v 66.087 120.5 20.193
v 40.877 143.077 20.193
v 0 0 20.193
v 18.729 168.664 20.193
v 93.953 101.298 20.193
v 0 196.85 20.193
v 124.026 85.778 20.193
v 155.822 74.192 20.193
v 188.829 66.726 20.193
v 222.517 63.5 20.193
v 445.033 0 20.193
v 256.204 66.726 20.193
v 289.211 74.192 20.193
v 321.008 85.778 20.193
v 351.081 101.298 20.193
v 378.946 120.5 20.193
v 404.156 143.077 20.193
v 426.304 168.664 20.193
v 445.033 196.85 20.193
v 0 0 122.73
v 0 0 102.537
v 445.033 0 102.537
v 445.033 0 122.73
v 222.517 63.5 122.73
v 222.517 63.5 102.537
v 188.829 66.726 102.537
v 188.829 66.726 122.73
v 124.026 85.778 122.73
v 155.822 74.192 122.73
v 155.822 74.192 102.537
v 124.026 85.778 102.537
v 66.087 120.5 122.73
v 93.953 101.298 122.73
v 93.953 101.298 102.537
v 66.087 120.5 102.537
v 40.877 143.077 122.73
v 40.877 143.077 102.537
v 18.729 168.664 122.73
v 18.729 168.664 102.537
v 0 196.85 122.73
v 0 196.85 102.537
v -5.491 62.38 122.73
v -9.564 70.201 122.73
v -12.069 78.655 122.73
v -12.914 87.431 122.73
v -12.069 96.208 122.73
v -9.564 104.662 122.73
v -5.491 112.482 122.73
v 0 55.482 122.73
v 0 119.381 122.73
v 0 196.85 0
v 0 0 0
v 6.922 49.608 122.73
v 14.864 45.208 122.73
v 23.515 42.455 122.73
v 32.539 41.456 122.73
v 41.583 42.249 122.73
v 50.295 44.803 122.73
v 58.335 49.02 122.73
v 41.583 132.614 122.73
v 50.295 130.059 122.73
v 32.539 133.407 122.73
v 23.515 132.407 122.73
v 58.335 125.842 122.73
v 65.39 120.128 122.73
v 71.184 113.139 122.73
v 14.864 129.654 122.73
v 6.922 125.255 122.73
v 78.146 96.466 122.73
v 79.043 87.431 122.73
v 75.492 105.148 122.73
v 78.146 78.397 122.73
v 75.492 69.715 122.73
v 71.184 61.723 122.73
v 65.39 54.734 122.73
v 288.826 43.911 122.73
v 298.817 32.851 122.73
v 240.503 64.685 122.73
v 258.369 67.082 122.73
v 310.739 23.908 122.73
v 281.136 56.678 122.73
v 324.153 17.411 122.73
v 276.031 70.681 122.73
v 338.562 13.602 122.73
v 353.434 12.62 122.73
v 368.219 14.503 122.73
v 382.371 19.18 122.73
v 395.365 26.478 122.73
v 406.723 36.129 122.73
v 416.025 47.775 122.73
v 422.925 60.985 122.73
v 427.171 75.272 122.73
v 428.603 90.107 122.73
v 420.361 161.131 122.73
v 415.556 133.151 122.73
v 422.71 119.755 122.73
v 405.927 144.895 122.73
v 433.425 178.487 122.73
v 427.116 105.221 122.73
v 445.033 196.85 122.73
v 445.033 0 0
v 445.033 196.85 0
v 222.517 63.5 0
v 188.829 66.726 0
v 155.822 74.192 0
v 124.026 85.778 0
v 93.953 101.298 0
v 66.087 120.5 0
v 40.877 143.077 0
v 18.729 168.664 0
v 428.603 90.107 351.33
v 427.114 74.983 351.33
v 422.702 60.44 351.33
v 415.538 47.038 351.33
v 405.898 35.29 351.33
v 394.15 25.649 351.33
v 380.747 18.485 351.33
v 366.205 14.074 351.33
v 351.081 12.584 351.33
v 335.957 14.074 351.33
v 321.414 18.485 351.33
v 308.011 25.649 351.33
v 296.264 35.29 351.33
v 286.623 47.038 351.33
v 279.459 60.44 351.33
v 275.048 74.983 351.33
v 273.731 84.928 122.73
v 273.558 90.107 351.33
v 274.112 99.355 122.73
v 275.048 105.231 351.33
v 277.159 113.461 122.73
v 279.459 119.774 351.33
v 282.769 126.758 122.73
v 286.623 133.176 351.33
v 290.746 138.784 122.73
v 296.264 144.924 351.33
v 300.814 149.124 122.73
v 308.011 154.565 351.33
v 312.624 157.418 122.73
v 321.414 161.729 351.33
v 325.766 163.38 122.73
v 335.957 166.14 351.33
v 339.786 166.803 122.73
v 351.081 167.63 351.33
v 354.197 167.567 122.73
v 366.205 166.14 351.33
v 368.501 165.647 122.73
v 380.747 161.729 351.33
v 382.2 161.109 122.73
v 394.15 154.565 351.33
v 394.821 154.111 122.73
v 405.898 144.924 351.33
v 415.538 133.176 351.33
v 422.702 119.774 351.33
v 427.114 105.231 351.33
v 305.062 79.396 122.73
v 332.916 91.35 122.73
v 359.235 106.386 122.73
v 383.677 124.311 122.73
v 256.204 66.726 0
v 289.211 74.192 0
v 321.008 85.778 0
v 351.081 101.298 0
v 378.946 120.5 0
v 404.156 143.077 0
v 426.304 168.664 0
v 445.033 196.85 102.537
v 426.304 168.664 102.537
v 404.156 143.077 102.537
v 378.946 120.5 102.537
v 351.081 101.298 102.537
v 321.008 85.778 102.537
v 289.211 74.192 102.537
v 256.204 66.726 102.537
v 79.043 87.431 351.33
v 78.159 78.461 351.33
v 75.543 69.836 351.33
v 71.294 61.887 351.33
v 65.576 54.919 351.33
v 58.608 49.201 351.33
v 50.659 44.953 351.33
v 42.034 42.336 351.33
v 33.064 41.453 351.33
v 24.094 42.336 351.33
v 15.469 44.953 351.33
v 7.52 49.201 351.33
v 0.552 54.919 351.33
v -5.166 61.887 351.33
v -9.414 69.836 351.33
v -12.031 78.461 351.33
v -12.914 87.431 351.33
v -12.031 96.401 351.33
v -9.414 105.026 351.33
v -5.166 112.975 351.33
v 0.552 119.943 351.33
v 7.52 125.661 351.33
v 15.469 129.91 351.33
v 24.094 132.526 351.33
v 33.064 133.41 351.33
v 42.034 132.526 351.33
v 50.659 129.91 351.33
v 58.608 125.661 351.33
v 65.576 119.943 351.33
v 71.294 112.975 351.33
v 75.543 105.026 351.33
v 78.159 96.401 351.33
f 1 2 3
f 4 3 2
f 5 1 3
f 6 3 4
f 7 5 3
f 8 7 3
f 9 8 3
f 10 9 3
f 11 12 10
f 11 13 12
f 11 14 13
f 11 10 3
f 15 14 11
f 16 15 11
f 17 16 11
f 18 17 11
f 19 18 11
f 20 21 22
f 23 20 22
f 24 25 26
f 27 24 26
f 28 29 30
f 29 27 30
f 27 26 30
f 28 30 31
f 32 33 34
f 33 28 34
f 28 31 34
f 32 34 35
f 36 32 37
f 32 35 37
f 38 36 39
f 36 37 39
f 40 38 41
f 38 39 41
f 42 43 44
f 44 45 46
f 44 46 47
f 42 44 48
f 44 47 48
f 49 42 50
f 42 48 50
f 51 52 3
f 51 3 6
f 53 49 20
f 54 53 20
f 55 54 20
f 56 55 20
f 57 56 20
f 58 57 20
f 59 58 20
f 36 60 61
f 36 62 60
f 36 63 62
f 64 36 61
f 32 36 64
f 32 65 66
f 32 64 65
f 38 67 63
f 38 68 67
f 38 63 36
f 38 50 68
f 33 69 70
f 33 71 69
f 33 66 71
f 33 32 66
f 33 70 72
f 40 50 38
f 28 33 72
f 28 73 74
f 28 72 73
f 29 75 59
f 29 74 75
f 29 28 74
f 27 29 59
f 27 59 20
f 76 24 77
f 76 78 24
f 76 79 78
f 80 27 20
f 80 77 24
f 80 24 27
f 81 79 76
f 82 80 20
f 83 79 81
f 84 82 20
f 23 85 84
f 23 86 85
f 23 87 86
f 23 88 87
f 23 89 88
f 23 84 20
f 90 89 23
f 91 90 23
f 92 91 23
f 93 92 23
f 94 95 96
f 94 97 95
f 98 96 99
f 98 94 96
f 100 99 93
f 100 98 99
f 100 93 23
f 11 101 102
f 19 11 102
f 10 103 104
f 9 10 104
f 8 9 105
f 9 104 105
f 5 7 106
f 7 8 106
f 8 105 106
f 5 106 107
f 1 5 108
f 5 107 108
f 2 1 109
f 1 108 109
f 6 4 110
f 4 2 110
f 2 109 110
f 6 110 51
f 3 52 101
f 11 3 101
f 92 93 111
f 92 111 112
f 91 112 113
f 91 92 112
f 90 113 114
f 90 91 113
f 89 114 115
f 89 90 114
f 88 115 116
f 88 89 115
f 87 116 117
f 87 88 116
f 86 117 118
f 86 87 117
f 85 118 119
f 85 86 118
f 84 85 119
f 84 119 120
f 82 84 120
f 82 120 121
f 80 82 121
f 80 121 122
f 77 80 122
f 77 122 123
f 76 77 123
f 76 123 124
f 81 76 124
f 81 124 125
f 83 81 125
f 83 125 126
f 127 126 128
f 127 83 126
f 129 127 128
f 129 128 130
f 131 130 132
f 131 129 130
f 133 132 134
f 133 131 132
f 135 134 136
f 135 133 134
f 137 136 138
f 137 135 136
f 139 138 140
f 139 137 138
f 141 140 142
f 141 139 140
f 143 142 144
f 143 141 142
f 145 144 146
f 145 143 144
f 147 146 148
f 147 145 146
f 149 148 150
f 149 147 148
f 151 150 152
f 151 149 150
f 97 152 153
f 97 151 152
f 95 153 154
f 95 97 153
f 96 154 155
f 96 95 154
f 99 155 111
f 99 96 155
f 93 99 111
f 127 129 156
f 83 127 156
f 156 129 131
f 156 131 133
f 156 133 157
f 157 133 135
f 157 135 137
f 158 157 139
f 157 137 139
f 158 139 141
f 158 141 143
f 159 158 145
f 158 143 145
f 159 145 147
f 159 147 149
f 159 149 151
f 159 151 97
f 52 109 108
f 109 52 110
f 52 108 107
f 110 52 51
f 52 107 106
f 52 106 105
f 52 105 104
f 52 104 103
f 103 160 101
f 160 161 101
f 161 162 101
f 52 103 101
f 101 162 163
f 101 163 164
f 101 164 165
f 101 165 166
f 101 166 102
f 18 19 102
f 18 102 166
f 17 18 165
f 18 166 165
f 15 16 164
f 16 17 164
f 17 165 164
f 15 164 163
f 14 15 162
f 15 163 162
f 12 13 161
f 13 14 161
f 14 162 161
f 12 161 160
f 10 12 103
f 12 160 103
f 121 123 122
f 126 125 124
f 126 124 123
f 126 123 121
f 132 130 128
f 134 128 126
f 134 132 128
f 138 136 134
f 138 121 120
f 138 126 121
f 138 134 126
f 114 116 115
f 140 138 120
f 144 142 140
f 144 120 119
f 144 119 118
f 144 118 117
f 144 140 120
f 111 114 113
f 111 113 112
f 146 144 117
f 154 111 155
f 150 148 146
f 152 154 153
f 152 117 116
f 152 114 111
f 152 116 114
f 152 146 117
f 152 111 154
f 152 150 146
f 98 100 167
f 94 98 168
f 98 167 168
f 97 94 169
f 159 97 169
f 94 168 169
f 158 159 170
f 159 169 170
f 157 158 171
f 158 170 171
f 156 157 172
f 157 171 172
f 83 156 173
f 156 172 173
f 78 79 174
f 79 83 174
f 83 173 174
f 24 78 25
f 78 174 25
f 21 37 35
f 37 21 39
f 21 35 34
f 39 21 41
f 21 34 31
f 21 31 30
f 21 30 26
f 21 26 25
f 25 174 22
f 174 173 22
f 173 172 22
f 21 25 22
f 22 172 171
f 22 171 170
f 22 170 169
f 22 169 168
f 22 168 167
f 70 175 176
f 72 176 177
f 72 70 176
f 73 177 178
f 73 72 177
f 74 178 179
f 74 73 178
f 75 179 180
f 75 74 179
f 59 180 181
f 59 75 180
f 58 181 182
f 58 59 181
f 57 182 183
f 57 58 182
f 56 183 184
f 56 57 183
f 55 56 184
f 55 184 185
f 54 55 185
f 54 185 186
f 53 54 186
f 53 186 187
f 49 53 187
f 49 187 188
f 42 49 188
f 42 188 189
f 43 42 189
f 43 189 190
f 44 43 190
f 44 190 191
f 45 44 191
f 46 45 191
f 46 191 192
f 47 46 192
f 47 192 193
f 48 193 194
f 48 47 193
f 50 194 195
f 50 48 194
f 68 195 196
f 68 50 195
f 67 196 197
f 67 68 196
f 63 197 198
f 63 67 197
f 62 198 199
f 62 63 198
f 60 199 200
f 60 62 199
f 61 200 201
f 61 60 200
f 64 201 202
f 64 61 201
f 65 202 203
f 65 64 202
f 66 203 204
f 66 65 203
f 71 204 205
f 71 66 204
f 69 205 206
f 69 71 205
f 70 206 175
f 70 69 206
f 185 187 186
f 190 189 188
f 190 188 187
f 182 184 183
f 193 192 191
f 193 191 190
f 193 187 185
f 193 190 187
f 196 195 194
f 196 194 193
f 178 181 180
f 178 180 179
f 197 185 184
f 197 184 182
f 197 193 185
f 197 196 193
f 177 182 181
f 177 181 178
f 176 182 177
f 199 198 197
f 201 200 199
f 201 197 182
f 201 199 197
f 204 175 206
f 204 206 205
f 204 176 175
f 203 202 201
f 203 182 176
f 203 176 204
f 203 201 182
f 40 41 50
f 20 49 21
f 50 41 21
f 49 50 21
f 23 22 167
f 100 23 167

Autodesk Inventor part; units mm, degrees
ref_plane "YZ Plane" through (0, 0, 0) normal (1, 0, 0) x (0, 1, 0)
ref_plane "XZ Plane" through (0, 0, 0) normal (0, 1, 0) x (-1, 0, 0)
ref_plane "XY Plane" through (0, 0, 0) normal (0, 0, 1) x (1, 0, 0)
sketch "Sketch1" plane through (0, 0, 0) normal (0, 0, 1) x (1, 0, 0)
  line L0 (0, 0) -> (445.0334, 0)
  line L1 (445.0334, 0) -> (445.0334, 196.85)
  line L2 (0, 0) -> (0, 196.85)
  arc A0 (0, 196.85) -> (222.5167, 63.5) centre (231.0477, 330.0635) ccw
  arc A1 (222.5167, 63.5) -> (445.0334, 196.85) centre (213.9857, 330.0635) ccw
  dimension "d0" = 445.0334
  dimension "d1" = 196.85
  dimension "d3" = 266.7
  dimension "d4" = 266.7
extrude "Extrusion1" add sketch "Sketch1" along normal blind 20.193
sketch "Sketch2" plane through (0, 0, 20.193) normal (0, 0, 1) x (1, 0, 0)
  line L0 (0, 0) -> (445.0334, 0) projected
  line L1 (111.2011, 0) -> (141.5914, 0)
  line L2 (141.5914, 0) -> (141.5914, 15.1977)
  line L3 (141.5914, 15.1977) -> (111.2011, 15.1977)
  line L4 (111.2011, 15.1977) -> (111.2011, 0)
extrude "Extrusion2" add sketch "Sketch2" along normal blind 82.3443
sketch "Sketch3" plane through (0, 0, 102.5373) normal (0, 0, 1) x (1, 0, 0)
  line L0 (111.2011, 0) -> (141.5914, 0) projected
  line L1 (141.5914, 0) -> (141.5914, 15.1977) projected
  line L2 (141.5914, 15.1977) -> (111.2011, 15.1977) projected
  line L3 (111.2011, 15.1977) -> (111.2011, 0) projected
  line L4 (141.5914, 15.1977) -> (141.5914, 0) projected
  line L5 (141.5914, 0) -> (445.0334, 0) projected
  line L6 (445.0334, 0) -> (445.0334, 196.85) projected
  arc A0 (222.5167, 63.5) -> (445.0334, 196.85) centre (213.9857, 330.0635) ccw projected
  arc A1 (0, 196.85) -> (222.5167, 63.5) centre (231.0477, 330.0635) ccw projected
  line L7 (0, 196.85) -> (0, 0) projected
  line L8 (0, 0) -> (111.2011, 0) projected
  line L9 (111.2011, 0) -> (111.2011, 15.1977) projected
  line L10 (111.2011, 15.1977) -> (141.5914, 15.1977) projected
extrude "Extrusion3" add sketch "Sketch3" along normal blind 20.193
sketch "Sketch4" plane through (111.2011, 15.1977, 20.193) normal (0, 1, 0) x (1, 0, 0)
  line L0 (0, 0) -> (30.3903, 0) projected
  line L1 (0, 0) -> (0, -82.3443) projected
  line L2 (30.3903, -82.3443) -> (0, -82.3443) projected
  line L3 (30.3903, 0) -> (30.3903, -82.3443) projected
  point P0 (-111.2011, 20.193)
extrude "Extrusion4" cut sketch "Sketch4" against normal blind 20.193
sketch "Sketch6" plane through (0, 0, 122.7303) normal (0, 0, 1) x (1, 0, 0)
  circle A0 centre (33.0642, 87.4312) radius 45.9785
  circle A1 centre (351.0807, 90.1071) radius 77.5227
extrude "Extrusion5" add sketch "Sketch6" along normal blind 228.6
properties part number "Robotics ball launcher guide"
